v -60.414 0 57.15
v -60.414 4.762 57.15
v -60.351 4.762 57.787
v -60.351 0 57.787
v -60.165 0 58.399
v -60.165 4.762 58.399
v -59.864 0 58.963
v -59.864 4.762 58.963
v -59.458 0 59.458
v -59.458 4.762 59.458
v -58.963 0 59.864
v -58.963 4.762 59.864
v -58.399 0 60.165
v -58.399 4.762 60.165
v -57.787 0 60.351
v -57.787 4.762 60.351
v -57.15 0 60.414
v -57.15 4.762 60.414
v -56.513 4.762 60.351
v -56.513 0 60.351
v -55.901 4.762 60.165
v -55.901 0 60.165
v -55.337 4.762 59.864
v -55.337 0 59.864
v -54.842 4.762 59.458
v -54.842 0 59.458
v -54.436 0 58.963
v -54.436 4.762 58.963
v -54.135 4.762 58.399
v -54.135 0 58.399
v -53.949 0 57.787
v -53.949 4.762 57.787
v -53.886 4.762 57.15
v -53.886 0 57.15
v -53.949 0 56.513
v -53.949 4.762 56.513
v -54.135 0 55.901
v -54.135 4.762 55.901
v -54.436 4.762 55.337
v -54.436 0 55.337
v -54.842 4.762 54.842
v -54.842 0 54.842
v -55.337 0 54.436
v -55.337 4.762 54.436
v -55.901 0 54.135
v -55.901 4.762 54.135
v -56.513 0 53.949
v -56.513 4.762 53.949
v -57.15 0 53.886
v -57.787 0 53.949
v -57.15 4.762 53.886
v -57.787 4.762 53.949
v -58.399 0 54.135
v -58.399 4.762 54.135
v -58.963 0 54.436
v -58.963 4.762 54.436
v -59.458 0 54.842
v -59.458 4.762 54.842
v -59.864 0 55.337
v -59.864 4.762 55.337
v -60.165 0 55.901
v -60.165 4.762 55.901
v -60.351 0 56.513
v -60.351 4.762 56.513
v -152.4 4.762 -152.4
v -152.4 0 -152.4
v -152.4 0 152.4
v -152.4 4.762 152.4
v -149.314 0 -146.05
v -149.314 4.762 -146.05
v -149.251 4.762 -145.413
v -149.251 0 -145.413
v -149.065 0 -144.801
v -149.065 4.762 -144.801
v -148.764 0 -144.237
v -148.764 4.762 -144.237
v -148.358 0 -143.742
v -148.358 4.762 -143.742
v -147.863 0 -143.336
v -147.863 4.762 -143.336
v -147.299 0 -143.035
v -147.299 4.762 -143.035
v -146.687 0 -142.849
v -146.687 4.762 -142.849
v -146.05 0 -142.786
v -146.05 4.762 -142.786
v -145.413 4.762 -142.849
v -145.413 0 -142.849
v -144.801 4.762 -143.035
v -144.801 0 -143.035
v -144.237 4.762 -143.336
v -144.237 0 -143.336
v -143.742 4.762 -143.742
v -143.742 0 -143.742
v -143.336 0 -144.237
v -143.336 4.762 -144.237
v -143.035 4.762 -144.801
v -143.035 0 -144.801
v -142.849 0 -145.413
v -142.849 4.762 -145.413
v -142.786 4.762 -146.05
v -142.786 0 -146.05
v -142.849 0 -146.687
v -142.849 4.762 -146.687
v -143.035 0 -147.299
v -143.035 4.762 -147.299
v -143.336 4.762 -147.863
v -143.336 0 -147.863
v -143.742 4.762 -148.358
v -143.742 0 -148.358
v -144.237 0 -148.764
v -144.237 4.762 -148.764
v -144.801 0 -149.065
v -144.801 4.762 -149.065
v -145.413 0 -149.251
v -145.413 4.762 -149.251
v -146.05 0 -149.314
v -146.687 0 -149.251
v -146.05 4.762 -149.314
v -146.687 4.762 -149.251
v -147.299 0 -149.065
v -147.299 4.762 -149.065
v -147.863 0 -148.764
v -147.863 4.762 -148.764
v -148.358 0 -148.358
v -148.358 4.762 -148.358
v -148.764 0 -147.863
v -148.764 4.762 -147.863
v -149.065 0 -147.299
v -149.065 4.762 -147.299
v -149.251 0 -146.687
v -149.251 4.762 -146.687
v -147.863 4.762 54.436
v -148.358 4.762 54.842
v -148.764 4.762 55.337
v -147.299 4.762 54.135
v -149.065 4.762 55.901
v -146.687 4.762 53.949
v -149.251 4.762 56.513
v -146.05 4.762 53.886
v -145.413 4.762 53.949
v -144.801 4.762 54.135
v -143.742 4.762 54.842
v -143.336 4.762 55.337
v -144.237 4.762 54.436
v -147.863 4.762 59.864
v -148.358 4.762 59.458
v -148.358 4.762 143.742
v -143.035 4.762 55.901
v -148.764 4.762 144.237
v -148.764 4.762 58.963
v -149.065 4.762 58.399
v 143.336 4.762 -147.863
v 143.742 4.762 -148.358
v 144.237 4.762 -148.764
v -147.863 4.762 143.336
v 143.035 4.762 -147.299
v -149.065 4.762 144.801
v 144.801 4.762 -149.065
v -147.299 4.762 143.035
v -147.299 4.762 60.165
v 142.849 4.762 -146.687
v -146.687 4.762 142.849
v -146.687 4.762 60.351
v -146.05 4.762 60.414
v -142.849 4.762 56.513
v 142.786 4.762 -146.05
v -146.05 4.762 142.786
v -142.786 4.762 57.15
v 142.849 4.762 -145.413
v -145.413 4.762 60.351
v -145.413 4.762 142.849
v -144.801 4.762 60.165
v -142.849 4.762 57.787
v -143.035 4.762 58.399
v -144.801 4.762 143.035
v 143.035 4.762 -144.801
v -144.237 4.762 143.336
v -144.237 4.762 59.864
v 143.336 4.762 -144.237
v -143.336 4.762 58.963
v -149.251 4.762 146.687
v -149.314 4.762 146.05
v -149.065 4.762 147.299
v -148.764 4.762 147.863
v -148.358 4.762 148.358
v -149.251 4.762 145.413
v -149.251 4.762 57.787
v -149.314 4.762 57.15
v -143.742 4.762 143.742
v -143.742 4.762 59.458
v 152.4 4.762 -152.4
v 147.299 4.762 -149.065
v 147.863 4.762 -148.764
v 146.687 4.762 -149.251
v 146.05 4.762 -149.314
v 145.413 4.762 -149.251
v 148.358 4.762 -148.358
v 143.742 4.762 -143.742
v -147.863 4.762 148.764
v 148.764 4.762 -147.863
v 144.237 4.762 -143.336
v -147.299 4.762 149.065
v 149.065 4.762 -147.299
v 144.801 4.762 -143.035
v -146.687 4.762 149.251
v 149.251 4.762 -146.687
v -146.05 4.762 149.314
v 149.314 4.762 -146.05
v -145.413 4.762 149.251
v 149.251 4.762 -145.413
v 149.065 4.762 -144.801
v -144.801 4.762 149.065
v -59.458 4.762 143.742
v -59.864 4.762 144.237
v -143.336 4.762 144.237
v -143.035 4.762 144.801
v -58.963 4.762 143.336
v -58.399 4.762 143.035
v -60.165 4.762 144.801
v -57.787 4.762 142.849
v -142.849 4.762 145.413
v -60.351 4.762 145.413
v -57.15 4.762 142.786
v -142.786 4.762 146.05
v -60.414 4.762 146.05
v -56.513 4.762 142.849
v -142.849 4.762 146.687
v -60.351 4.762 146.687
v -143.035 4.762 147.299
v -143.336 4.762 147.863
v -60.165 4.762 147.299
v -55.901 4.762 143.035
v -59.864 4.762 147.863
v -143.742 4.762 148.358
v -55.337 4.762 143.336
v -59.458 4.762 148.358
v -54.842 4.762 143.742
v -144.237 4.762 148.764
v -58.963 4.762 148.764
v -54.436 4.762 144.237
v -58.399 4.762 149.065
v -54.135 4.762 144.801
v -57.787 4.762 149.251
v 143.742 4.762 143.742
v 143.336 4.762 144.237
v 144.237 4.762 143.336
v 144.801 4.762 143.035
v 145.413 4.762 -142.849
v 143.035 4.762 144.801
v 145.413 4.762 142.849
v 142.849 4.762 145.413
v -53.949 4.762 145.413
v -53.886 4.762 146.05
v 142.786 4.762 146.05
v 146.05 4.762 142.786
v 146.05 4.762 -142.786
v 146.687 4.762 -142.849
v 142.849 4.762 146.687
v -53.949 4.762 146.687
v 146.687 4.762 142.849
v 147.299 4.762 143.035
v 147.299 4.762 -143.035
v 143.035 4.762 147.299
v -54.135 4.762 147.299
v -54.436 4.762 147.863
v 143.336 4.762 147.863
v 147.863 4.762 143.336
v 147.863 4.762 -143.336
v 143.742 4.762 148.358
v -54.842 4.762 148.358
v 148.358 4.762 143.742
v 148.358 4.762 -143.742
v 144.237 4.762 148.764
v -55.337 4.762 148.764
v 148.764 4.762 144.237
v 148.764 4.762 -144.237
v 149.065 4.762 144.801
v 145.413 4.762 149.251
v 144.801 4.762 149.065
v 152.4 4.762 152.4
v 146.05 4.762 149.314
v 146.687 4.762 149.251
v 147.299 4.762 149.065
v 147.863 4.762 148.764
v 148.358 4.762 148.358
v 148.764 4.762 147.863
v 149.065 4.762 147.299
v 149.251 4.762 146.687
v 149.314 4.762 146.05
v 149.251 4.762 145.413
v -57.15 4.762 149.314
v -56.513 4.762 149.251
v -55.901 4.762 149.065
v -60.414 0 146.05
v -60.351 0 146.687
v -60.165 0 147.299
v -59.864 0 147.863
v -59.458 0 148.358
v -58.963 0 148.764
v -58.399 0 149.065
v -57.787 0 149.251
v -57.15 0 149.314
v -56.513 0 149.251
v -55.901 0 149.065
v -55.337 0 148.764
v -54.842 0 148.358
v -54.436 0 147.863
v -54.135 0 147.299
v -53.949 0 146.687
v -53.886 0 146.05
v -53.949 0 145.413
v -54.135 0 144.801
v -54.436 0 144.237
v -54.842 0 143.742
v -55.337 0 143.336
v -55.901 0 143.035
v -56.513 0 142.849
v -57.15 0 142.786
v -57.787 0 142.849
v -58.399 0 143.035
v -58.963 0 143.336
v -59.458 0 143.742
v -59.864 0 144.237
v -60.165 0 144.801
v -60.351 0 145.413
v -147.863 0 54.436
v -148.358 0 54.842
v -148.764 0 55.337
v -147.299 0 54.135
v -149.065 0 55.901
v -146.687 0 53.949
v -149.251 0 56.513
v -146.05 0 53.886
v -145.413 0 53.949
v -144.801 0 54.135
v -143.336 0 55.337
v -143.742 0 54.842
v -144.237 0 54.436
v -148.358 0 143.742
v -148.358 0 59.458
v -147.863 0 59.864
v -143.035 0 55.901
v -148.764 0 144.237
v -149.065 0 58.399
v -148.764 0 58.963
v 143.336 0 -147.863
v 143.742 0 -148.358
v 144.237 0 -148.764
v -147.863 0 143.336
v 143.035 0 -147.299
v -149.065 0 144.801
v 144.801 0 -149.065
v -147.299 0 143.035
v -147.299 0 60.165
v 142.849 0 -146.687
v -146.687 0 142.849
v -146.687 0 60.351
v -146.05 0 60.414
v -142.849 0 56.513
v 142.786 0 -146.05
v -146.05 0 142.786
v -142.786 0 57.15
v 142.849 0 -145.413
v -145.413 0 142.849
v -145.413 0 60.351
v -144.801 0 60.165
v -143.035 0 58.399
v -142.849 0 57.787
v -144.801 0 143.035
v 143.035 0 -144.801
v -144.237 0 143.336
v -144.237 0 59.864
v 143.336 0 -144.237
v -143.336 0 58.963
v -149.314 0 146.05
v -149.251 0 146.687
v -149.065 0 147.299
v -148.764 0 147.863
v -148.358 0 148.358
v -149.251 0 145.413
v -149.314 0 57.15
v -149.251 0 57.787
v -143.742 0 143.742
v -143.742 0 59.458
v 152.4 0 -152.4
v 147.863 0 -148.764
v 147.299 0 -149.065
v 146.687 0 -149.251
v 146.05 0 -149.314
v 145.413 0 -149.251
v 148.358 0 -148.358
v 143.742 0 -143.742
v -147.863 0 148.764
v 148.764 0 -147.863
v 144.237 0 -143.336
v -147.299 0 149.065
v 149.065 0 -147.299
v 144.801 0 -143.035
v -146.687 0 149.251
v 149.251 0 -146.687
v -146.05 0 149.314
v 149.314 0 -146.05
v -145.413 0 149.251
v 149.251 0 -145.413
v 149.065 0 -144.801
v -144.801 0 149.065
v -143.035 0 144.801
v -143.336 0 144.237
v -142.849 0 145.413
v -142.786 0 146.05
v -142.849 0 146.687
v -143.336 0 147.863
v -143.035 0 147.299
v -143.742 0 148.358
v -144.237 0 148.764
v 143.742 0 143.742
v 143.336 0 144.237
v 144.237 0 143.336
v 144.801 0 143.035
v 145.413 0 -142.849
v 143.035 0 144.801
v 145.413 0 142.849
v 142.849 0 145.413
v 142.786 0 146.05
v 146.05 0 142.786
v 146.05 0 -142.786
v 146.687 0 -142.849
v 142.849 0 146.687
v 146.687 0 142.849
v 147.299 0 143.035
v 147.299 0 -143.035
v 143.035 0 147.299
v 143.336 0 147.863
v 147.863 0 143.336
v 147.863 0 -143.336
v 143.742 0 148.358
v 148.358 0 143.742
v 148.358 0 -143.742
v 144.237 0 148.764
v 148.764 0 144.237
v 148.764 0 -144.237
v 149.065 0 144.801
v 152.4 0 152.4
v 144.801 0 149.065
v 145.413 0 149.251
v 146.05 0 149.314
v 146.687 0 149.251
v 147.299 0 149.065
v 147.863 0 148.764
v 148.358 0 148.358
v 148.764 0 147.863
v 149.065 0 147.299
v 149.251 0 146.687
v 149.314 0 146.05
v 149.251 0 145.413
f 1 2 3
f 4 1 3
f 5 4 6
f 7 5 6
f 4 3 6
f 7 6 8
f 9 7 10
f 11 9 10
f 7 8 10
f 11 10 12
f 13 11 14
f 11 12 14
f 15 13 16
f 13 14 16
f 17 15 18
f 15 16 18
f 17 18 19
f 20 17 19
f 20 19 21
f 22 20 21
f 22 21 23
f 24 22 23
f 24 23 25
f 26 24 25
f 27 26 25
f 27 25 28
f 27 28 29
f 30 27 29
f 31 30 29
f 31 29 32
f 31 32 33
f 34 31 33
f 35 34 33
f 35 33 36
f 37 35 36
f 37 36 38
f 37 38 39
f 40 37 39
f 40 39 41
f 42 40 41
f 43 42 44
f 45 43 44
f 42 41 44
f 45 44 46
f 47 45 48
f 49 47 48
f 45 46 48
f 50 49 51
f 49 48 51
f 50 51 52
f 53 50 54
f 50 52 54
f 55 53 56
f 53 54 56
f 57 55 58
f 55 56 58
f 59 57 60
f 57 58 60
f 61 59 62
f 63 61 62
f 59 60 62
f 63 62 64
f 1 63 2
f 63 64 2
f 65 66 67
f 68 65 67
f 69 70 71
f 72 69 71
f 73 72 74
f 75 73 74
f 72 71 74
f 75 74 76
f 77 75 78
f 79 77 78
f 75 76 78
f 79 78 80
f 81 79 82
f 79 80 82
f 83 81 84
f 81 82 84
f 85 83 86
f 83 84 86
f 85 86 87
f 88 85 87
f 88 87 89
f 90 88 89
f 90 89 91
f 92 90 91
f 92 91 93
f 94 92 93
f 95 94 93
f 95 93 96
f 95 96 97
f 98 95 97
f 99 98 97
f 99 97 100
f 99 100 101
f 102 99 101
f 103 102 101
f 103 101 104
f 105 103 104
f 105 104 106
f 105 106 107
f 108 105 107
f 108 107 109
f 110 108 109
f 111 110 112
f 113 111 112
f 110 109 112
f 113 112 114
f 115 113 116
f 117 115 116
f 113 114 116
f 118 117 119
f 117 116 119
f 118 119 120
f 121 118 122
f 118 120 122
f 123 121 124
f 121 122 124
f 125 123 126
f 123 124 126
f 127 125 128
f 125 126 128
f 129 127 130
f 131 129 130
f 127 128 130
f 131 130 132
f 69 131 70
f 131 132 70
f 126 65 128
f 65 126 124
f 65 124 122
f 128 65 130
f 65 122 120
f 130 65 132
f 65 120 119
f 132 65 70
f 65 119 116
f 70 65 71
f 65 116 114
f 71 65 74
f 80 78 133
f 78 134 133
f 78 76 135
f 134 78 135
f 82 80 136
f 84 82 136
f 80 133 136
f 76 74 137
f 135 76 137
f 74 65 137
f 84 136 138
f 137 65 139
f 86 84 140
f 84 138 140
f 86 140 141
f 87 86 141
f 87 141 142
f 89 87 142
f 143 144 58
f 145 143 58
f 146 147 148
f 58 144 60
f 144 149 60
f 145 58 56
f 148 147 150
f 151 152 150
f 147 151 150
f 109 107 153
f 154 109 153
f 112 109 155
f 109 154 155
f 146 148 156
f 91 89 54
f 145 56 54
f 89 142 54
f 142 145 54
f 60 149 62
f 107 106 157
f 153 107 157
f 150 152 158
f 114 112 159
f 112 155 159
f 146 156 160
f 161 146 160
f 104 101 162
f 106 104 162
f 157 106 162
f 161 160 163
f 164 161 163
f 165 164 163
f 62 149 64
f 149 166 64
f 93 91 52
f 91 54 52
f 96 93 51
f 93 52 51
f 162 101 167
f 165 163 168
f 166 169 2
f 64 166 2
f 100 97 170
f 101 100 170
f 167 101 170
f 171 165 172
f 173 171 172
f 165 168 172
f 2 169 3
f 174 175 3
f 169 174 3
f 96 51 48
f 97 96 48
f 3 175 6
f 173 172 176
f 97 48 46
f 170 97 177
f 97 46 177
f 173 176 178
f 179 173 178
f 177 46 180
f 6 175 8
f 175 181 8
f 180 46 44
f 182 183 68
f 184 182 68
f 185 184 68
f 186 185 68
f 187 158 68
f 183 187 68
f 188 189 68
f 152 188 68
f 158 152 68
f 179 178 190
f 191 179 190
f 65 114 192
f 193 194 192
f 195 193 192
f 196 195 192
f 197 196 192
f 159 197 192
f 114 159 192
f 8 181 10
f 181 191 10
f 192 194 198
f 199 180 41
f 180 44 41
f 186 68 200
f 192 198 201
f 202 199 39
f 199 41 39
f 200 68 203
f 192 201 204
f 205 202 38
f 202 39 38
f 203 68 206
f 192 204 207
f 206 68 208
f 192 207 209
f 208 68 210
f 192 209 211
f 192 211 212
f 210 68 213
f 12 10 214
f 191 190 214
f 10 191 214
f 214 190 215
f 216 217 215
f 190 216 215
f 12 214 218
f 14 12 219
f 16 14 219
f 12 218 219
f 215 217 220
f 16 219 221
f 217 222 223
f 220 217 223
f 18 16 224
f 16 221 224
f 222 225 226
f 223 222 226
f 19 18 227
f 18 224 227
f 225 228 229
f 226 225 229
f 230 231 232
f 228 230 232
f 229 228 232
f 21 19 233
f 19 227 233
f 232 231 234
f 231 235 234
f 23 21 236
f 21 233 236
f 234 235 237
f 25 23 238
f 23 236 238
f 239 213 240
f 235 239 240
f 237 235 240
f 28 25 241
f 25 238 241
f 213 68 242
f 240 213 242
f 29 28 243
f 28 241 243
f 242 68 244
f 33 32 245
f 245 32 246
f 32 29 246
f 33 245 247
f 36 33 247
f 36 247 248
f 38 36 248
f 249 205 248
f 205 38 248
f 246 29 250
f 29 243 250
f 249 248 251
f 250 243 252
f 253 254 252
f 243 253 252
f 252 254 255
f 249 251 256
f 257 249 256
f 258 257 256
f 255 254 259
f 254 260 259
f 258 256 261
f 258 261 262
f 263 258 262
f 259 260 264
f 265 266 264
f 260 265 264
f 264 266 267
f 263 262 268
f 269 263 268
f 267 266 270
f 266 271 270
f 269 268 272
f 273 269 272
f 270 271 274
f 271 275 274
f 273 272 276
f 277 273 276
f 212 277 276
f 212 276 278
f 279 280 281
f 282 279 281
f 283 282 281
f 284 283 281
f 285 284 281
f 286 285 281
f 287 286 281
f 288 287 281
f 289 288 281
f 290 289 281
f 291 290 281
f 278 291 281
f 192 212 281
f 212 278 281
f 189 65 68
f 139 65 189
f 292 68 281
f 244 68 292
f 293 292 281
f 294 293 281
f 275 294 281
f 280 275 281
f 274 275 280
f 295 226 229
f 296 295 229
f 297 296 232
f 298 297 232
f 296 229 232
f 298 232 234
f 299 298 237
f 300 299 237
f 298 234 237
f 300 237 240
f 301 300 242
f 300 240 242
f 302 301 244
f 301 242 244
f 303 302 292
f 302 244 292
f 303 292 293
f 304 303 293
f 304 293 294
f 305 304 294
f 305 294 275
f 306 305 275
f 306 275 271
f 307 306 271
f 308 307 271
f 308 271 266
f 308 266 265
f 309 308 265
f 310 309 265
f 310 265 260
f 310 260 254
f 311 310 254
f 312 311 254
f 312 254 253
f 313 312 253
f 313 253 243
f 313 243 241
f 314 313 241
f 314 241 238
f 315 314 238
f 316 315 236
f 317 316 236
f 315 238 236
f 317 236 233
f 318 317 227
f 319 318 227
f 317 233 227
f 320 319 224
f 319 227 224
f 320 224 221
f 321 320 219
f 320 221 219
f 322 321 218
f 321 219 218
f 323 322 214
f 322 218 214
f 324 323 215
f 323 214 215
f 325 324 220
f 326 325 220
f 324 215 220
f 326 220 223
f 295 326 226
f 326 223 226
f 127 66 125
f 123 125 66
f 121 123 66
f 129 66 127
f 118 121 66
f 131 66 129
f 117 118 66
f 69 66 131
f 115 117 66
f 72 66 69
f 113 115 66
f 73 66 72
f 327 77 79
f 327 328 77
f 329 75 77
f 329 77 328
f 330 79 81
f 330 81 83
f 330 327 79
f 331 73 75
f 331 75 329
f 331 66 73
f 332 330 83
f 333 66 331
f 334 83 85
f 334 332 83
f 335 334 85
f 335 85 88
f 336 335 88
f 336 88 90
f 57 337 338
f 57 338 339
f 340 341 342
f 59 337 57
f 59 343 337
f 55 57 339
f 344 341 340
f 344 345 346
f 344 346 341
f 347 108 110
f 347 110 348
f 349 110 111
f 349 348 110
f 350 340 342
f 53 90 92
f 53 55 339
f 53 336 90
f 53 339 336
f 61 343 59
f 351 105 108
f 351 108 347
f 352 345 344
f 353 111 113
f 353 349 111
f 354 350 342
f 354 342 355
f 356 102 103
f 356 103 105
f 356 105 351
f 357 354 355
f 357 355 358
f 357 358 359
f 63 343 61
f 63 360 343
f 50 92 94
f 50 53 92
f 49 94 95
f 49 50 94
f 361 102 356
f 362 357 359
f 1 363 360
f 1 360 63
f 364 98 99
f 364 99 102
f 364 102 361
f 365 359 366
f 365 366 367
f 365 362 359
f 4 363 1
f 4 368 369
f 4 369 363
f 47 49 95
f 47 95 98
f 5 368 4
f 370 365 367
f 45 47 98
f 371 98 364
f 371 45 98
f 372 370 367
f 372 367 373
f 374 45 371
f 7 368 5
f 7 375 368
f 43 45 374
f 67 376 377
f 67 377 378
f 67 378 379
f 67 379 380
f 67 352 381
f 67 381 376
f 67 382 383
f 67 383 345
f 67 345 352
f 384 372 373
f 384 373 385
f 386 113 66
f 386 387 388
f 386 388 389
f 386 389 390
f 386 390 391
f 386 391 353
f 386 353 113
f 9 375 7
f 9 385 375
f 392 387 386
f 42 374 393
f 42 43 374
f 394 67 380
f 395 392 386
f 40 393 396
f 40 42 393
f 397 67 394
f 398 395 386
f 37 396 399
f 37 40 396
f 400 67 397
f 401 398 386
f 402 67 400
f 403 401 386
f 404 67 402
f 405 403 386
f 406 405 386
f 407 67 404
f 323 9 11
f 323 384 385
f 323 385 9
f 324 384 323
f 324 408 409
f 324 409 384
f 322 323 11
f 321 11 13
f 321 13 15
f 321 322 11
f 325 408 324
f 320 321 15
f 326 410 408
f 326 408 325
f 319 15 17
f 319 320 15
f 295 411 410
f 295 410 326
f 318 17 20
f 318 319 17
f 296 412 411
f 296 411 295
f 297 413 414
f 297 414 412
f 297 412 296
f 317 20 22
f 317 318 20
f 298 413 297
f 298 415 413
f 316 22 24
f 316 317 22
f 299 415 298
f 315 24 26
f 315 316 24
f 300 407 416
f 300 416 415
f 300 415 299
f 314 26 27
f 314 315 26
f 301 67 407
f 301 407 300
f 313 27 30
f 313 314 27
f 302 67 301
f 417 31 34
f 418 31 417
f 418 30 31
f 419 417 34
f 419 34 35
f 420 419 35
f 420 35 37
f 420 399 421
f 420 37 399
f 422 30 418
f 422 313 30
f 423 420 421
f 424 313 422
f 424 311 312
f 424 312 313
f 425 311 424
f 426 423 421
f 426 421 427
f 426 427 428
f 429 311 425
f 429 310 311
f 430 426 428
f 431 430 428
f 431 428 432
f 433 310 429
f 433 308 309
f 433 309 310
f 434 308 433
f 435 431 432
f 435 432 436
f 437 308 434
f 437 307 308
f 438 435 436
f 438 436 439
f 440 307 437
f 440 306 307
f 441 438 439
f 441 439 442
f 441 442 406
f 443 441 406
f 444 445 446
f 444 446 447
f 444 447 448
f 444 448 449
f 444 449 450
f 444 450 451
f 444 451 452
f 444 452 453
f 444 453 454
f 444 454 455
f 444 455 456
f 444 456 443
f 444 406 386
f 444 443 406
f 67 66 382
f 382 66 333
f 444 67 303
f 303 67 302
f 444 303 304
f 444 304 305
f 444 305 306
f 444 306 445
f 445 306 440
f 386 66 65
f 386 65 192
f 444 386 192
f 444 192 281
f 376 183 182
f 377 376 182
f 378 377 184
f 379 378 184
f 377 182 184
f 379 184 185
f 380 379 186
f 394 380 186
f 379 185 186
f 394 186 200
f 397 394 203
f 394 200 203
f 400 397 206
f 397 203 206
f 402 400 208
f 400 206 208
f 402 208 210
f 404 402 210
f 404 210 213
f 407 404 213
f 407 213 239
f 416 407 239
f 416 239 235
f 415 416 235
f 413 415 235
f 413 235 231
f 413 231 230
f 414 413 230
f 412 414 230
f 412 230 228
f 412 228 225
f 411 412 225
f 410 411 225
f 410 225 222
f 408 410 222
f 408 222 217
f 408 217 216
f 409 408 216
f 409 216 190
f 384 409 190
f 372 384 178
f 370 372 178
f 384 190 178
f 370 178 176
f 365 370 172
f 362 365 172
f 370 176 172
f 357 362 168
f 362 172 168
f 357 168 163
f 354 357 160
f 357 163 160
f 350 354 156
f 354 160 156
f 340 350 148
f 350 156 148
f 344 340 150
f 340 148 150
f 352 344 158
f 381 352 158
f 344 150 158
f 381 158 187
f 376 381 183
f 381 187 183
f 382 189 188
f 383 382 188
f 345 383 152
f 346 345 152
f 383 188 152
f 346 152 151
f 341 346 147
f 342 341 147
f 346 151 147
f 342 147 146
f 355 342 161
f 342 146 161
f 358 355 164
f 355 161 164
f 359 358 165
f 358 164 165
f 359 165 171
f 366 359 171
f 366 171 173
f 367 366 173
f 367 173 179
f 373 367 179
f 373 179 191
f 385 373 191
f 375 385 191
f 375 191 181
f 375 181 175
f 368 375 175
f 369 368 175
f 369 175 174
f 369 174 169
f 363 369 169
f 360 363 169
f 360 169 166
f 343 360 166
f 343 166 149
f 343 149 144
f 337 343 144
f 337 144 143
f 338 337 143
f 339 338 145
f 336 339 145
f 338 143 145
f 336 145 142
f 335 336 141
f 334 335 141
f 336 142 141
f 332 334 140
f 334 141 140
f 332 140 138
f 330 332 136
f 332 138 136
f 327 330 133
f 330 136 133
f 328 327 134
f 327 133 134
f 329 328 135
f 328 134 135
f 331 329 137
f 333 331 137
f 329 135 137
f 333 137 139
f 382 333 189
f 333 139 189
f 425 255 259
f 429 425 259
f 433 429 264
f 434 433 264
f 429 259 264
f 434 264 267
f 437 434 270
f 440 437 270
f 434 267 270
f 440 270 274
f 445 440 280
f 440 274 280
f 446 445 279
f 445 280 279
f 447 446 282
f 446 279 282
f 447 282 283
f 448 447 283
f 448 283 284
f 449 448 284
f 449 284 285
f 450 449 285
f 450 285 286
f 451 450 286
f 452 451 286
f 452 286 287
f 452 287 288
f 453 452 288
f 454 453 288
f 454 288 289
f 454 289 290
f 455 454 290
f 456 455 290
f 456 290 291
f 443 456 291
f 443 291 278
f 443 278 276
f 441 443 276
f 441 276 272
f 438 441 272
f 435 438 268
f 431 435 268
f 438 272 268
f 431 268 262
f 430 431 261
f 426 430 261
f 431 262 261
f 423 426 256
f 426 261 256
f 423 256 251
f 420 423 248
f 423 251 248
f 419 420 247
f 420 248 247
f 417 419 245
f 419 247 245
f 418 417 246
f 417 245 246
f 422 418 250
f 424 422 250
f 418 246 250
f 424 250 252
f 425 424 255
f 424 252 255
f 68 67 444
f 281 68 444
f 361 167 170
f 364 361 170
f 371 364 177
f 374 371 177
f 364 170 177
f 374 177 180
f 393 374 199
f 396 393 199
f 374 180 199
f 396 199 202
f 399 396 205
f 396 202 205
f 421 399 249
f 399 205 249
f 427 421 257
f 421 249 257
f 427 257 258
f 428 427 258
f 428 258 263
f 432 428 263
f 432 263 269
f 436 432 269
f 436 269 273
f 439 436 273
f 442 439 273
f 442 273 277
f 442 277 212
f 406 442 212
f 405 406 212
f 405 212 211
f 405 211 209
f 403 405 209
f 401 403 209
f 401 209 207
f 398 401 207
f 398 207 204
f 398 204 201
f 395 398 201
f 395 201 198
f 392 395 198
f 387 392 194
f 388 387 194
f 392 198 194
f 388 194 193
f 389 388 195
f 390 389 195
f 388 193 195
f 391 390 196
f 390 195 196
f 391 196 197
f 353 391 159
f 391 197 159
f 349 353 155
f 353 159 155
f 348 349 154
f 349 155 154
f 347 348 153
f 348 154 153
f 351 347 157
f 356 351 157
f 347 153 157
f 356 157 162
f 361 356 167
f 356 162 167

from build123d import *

# Parameters (mm, degrees)
F0_W     = 304.8
F0_H     = 304.8
F0_W_2   = 88.9
F0_H_2   = 88.9
F0_R     = 12.7
F1_DEPTH = 4.7625
F2_D     = 6.5278
F3_D     = 6.5278


with BuildPart() as f1:
    # F0 (on Front) → F1 (new body)
    with BuildSketch(Plane.XZ):
        Rectangle(F0_W, F0_H)
        with Locations((-101.6, 101.6)):
            Rectangle(F0_W_2, F0_H_2, mode=Mode.SUBTRACT)
        with Locations((-101.6, 101.6)):
            Rectangle(F0_W_2, F0_H_2)
        with Locations((-101.6, 101.6)):
            Circle(F0_R, mode=Mode.SUBTRACT)
        with Locations((-101.6, 101.6)):
            Circle(F0_R)
    extrude(amount=-F1_DEPTH)

    # F2 (through all)
    with Locations(Plane.XZ):
        with Locations((-146.05, 146.05), (146.05, -146.05), (146.05, 146.05), (-146.05, -146.05)):
            Hole(F2_D / 2)

    # F3 (through all)
    with Locations(Plane.XZ):
        with Locations((-146.05, 146.05), (-57.15, 146.05), (-57.15, 57.15), (-146.05, 57.15)):
            Hole(F3_D / 2)


solid = f1.part
